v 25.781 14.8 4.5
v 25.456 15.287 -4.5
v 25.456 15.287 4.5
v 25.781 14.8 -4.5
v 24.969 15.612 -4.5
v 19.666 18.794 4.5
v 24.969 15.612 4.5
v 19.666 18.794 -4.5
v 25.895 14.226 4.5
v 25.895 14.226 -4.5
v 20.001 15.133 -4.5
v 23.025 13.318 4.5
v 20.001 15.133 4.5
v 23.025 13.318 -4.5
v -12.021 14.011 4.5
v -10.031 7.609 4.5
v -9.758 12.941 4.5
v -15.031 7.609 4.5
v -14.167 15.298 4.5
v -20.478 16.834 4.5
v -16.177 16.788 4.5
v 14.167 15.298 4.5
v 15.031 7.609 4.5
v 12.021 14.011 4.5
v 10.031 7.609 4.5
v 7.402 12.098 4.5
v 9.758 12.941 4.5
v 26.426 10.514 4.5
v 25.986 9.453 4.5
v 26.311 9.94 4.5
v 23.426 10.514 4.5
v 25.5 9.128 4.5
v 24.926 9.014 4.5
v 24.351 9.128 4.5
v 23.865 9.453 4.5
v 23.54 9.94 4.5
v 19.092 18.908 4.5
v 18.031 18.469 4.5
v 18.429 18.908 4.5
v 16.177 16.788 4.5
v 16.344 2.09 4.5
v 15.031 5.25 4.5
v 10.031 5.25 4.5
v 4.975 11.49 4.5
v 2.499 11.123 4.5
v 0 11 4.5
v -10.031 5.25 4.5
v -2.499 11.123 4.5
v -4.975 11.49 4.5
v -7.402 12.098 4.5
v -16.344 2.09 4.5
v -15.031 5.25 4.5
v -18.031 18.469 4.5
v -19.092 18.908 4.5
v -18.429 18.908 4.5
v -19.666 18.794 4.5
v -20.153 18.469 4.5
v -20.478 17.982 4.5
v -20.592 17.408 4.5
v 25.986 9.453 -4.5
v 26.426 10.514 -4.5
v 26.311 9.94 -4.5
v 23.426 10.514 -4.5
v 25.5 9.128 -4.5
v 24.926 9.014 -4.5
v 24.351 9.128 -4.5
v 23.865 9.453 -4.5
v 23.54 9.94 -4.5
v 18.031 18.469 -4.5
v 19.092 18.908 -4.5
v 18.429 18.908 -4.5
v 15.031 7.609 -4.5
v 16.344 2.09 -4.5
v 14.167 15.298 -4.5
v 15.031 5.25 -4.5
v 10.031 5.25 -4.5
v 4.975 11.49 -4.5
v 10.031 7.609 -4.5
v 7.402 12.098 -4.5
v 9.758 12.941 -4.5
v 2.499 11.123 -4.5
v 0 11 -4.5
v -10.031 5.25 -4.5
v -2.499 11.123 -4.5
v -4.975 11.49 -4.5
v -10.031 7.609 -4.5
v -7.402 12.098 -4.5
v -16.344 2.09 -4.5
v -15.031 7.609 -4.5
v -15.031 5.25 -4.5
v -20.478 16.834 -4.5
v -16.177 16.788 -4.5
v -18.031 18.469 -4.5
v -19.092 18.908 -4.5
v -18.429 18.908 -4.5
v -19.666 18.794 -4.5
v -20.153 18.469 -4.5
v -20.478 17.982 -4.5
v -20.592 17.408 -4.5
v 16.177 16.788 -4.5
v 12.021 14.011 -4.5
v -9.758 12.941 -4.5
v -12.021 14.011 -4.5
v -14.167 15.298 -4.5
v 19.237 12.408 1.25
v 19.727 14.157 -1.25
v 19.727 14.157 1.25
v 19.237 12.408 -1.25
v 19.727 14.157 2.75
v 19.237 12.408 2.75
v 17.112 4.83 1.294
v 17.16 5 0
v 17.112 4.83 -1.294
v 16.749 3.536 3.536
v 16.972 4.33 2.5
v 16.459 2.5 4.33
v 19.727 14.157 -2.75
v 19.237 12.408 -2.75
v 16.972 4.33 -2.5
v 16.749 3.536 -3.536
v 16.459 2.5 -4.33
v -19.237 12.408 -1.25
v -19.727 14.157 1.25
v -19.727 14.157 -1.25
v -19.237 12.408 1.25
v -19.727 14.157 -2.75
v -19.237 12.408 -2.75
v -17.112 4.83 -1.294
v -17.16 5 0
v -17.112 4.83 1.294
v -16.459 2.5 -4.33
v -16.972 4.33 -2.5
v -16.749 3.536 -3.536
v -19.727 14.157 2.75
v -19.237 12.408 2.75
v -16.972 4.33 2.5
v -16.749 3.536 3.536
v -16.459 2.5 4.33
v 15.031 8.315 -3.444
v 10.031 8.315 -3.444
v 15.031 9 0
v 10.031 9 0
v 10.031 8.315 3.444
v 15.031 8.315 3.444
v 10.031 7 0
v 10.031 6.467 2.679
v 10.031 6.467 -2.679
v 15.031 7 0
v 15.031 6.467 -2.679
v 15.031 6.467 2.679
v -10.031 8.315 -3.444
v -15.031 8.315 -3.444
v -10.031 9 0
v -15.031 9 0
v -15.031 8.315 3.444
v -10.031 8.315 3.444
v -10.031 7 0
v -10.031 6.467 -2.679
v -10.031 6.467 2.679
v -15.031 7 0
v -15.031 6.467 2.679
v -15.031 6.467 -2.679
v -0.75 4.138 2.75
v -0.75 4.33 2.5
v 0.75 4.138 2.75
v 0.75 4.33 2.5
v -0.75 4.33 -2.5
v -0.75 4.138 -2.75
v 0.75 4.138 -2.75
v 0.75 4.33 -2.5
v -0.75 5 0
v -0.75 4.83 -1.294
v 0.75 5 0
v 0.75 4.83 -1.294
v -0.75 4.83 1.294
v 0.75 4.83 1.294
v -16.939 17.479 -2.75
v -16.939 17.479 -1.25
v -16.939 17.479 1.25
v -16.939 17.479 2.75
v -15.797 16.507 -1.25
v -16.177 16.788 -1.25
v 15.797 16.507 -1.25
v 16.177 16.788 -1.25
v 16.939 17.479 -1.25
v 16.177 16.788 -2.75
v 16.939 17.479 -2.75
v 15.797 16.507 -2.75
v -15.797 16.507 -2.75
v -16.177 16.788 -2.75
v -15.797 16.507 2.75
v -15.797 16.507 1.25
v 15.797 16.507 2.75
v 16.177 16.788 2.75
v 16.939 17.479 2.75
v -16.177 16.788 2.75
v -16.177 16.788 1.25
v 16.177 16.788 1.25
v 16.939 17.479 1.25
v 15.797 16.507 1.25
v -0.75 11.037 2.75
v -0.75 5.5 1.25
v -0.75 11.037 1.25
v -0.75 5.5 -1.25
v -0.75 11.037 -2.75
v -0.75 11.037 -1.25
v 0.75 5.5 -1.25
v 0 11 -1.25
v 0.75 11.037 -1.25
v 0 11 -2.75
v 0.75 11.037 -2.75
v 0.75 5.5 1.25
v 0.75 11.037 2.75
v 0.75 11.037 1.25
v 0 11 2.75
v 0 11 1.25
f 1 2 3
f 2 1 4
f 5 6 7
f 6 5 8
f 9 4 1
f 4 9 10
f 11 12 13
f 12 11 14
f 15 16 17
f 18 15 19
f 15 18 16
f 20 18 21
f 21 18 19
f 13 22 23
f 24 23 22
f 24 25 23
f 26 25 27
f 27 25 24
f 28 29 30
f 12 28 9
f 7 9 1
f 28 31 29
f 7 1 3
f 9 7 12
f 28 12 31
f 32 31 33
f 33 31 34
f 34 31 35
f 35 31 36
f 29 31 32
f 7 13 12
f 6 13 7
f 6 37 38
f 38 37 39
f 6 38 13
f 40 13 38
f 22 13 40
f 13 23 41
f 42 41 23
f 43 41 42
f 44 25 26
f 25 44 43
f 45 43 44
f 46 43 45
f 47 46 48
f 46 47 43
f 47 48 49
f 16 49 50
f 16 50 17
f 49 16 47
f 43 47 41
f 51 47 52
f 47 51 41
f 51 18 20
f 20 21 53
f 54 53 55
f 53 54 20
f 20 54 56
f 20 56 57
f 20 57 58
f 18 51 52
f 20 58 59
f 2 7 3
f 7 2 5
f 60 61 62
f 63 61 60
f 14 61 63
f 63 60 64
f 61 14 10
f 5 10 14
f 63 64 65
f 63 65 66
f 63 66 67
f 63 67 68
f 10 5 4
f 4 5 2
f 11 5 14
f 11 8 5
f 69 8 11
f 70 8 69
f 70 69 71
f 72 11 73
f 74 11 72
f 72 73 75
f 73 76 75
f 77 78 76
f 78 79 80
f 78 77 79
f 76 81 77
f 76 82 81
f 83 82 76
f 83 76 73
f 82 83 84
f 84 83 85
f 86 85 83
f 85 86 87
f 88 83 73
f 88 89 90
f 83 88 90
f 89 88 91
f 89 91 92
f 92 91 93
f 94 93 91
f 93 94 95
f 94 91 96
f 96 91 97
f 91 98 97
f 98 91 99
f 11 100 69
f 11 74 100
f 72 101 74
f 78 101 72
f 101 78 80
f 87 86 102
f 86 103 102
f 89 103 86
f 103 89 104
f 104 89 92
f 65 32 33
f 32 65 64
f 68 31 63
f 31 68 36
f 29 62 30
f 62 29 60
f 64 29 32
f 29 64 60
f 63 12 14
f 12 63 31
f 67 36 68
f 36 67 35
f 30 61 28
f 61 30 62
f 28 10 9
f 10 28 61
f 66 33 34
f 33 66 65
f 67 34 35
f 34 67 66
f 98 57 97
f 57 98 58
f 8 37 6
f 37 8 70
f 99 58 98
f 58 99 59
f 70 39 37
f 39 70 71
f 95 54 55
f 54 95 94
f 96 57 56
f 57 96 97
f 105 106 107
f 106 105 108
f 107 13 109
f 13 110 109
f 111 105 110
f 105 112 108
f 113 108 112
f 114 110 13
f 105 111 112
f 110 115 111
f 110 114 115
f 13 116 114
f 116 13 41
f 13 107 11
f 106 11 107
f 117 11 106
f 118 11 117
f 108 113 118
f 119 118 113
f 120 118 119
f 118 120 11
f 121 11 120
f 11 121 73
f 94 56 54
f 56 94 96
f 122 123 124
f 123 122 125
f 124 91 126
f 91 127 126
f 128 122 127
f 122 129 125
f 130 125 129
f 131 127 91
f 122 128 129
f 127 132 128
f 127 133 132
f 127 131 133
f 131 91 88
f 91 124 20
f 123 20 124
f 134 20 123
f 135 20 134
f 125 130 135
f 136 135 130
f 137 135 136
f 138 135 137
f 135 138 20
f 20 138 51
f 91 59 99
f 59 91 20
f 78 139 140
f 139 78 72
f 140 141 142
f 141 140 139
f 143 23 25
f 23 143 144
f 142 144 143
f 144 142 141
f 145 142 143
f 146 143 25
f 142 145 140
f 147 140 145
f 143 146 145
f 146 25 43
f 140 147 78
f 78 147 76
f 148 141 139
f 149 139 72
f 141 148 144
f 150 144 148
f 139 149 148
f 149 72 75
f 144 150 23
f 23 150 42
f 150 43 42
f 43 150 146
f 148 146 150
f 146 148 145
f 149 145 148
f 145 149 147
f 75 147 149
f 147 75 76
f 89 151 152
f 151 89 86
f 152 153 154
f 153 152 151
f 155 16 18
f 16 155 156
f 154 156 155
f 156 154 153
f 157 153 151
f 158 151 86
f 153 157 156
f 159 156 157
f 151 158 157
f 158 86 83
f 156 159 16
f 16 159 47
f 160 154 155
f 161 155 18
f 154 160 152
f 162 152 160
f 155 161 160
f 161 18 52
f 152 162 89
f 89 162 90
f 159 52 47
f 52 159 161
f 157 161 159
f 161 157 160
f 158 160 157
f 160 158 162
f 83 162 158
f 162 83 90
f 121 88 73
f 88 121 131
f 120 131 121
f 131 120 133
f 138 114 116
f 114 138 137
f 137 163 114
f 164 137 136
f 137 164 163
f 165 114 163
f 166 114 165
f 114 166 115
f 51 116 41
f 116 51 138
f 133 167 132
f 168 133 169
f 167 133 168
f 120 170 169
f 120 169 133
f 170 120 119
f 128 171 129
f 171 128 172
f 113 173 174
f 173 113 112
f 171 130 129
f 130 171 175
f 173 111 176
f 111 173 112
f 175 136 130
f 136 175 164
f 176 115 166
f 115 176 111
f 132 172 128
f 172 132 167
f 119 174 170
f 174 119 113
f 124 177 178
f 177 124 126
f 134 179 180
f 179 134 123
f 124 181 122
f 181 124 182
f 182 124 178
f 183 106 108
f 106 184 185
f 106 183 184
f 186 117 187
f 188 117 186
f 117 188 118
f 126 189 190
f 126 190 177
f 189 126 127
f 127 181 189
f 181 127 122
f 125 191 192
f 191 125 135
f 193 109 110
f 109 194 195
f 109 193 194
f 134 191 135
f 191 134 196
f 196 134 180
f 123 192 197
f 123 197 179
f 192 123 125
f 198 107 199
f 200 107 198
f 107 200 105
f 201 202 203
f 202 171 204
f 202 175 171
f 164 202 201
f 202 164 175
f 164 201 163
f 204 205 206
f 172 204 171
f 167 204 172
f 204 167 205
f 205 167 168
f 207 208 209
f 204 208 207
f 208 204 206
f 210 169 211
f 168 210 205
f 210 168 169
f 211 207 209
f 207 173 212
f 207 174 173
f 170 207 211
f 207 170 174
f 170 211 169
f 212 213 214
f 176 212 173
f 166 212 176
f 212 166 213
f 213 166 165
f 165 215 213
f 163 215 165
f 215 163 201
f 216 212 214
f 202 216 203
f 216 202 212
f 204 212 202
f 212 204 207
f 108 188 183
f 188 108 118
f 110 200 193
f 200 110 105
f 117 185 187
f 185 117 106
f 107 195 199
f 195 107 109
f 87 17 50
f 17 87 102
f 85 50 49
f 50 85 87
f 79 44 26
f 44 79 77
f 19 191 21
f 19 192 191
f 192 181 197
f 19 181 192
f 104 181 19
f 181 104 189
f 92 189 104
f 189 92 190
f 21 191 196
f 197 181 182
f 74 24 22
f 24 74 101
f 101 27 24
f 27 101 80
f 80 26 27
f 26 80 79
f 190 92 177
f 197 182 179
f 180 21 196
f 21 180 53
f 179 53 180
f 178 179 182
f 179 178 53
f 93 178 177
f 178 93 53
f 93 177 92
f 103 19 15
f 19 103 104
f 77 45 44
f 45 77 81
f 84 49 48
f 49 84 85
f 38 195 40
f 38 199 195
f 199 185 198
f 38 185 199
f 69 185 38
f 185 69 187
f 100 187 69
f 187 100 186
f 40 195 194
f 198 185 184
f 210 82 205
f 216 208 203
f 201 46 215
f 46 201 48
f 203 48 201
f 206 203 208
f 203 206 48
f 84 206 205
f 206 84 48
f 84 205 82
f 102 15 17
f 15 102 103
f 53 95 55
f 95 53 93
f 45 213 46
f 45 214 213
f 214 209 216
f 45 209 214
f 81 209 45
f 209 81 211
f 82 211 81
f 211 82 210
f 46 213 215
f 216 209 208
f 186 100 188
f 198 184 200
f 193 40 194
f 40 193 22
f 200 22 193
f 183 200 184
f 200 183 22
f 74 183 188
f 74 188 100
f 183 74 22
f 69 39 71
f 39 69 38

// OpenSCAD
/* Mount for clipping the loose tubes to the inside of the rack
(c) Richard Bowman 2016, released under CERN open hardware license.
*/

use <utilities.scad>;
d=0.05;
$fn=16;

tube_r = 22+0.5+3; //radius of large tube
tube_to_rack = 6; //separation between 
rack_r = 5;
tube_centre = [0,tube_r+rack_r+tube_to_rack,0];
h = 2*rack_r - 1;
angle_subtended = 90;
w = sin(angle_subtended/2) * tube_r * 2 - 4;
hook_t = 3;

module annulus(inner_r,thickness,h,center=false){
	difference(){
		cylinder(r=inner_r+thickness,h=h,center=center);
		cylinder(r=inner_r,h=99999,center=true);
	}
}
module cable_tie(inner_r,center=false){
	annulus(inner_r+2,2,5,center=center);
}


difference(){
    union(){    
        hull(){
            translate([0,1,0]) cube([w,d,h], center=true);
            reflect([1,0,0]) translate(tube_centre) rotate(angle_subtended/2) translate([0,-tube_r-hook_t/2,0]) cylinder(h=h, d=hook_t, center=true);
        }
        translate(tube_centre) rotate(angle_subtended/2) translate([0,-tube_r-hook_t/2,0]) sequential_hull(){
            cylinder(h=h, d=hook_t, center=true);
            translate([hook_t*0.5,-hook_t*2,0]) cylinder(h=h, d=hook_t, center=true);
            translate([-hook_t*0.25,-hook_t*3,0]) cylinder(h=h, d=hook_t, center=true);
        }
    }
    //big tube
    translate(tube_centre) cylinder(r=tube_r, h=999,center=true, $fn=64);
    //rack
    rotate([0,90,0]){
        cylinder(r=rack_r, h=999,center=true, $fn=24);
        reflect([0,0,1]) translate([0,0,w/2-6]) cable_tie(rack_r);
    }
    
    //fixed end of elastic/bungee
    
    //attachment for two-sided velcro
    translate(tube_centre) for(a=[-40,0,40]) rotate(a+180){
        repeat([0,0,4,],2,center=true) cube([1.5,2*tube_r+2*tube_to_rack,1.5],center=true);
        translate([0,tube_r+tube_to_rack+5,0]) cube([1.5,10+1,4+1.5],center=true); 
    }
}
